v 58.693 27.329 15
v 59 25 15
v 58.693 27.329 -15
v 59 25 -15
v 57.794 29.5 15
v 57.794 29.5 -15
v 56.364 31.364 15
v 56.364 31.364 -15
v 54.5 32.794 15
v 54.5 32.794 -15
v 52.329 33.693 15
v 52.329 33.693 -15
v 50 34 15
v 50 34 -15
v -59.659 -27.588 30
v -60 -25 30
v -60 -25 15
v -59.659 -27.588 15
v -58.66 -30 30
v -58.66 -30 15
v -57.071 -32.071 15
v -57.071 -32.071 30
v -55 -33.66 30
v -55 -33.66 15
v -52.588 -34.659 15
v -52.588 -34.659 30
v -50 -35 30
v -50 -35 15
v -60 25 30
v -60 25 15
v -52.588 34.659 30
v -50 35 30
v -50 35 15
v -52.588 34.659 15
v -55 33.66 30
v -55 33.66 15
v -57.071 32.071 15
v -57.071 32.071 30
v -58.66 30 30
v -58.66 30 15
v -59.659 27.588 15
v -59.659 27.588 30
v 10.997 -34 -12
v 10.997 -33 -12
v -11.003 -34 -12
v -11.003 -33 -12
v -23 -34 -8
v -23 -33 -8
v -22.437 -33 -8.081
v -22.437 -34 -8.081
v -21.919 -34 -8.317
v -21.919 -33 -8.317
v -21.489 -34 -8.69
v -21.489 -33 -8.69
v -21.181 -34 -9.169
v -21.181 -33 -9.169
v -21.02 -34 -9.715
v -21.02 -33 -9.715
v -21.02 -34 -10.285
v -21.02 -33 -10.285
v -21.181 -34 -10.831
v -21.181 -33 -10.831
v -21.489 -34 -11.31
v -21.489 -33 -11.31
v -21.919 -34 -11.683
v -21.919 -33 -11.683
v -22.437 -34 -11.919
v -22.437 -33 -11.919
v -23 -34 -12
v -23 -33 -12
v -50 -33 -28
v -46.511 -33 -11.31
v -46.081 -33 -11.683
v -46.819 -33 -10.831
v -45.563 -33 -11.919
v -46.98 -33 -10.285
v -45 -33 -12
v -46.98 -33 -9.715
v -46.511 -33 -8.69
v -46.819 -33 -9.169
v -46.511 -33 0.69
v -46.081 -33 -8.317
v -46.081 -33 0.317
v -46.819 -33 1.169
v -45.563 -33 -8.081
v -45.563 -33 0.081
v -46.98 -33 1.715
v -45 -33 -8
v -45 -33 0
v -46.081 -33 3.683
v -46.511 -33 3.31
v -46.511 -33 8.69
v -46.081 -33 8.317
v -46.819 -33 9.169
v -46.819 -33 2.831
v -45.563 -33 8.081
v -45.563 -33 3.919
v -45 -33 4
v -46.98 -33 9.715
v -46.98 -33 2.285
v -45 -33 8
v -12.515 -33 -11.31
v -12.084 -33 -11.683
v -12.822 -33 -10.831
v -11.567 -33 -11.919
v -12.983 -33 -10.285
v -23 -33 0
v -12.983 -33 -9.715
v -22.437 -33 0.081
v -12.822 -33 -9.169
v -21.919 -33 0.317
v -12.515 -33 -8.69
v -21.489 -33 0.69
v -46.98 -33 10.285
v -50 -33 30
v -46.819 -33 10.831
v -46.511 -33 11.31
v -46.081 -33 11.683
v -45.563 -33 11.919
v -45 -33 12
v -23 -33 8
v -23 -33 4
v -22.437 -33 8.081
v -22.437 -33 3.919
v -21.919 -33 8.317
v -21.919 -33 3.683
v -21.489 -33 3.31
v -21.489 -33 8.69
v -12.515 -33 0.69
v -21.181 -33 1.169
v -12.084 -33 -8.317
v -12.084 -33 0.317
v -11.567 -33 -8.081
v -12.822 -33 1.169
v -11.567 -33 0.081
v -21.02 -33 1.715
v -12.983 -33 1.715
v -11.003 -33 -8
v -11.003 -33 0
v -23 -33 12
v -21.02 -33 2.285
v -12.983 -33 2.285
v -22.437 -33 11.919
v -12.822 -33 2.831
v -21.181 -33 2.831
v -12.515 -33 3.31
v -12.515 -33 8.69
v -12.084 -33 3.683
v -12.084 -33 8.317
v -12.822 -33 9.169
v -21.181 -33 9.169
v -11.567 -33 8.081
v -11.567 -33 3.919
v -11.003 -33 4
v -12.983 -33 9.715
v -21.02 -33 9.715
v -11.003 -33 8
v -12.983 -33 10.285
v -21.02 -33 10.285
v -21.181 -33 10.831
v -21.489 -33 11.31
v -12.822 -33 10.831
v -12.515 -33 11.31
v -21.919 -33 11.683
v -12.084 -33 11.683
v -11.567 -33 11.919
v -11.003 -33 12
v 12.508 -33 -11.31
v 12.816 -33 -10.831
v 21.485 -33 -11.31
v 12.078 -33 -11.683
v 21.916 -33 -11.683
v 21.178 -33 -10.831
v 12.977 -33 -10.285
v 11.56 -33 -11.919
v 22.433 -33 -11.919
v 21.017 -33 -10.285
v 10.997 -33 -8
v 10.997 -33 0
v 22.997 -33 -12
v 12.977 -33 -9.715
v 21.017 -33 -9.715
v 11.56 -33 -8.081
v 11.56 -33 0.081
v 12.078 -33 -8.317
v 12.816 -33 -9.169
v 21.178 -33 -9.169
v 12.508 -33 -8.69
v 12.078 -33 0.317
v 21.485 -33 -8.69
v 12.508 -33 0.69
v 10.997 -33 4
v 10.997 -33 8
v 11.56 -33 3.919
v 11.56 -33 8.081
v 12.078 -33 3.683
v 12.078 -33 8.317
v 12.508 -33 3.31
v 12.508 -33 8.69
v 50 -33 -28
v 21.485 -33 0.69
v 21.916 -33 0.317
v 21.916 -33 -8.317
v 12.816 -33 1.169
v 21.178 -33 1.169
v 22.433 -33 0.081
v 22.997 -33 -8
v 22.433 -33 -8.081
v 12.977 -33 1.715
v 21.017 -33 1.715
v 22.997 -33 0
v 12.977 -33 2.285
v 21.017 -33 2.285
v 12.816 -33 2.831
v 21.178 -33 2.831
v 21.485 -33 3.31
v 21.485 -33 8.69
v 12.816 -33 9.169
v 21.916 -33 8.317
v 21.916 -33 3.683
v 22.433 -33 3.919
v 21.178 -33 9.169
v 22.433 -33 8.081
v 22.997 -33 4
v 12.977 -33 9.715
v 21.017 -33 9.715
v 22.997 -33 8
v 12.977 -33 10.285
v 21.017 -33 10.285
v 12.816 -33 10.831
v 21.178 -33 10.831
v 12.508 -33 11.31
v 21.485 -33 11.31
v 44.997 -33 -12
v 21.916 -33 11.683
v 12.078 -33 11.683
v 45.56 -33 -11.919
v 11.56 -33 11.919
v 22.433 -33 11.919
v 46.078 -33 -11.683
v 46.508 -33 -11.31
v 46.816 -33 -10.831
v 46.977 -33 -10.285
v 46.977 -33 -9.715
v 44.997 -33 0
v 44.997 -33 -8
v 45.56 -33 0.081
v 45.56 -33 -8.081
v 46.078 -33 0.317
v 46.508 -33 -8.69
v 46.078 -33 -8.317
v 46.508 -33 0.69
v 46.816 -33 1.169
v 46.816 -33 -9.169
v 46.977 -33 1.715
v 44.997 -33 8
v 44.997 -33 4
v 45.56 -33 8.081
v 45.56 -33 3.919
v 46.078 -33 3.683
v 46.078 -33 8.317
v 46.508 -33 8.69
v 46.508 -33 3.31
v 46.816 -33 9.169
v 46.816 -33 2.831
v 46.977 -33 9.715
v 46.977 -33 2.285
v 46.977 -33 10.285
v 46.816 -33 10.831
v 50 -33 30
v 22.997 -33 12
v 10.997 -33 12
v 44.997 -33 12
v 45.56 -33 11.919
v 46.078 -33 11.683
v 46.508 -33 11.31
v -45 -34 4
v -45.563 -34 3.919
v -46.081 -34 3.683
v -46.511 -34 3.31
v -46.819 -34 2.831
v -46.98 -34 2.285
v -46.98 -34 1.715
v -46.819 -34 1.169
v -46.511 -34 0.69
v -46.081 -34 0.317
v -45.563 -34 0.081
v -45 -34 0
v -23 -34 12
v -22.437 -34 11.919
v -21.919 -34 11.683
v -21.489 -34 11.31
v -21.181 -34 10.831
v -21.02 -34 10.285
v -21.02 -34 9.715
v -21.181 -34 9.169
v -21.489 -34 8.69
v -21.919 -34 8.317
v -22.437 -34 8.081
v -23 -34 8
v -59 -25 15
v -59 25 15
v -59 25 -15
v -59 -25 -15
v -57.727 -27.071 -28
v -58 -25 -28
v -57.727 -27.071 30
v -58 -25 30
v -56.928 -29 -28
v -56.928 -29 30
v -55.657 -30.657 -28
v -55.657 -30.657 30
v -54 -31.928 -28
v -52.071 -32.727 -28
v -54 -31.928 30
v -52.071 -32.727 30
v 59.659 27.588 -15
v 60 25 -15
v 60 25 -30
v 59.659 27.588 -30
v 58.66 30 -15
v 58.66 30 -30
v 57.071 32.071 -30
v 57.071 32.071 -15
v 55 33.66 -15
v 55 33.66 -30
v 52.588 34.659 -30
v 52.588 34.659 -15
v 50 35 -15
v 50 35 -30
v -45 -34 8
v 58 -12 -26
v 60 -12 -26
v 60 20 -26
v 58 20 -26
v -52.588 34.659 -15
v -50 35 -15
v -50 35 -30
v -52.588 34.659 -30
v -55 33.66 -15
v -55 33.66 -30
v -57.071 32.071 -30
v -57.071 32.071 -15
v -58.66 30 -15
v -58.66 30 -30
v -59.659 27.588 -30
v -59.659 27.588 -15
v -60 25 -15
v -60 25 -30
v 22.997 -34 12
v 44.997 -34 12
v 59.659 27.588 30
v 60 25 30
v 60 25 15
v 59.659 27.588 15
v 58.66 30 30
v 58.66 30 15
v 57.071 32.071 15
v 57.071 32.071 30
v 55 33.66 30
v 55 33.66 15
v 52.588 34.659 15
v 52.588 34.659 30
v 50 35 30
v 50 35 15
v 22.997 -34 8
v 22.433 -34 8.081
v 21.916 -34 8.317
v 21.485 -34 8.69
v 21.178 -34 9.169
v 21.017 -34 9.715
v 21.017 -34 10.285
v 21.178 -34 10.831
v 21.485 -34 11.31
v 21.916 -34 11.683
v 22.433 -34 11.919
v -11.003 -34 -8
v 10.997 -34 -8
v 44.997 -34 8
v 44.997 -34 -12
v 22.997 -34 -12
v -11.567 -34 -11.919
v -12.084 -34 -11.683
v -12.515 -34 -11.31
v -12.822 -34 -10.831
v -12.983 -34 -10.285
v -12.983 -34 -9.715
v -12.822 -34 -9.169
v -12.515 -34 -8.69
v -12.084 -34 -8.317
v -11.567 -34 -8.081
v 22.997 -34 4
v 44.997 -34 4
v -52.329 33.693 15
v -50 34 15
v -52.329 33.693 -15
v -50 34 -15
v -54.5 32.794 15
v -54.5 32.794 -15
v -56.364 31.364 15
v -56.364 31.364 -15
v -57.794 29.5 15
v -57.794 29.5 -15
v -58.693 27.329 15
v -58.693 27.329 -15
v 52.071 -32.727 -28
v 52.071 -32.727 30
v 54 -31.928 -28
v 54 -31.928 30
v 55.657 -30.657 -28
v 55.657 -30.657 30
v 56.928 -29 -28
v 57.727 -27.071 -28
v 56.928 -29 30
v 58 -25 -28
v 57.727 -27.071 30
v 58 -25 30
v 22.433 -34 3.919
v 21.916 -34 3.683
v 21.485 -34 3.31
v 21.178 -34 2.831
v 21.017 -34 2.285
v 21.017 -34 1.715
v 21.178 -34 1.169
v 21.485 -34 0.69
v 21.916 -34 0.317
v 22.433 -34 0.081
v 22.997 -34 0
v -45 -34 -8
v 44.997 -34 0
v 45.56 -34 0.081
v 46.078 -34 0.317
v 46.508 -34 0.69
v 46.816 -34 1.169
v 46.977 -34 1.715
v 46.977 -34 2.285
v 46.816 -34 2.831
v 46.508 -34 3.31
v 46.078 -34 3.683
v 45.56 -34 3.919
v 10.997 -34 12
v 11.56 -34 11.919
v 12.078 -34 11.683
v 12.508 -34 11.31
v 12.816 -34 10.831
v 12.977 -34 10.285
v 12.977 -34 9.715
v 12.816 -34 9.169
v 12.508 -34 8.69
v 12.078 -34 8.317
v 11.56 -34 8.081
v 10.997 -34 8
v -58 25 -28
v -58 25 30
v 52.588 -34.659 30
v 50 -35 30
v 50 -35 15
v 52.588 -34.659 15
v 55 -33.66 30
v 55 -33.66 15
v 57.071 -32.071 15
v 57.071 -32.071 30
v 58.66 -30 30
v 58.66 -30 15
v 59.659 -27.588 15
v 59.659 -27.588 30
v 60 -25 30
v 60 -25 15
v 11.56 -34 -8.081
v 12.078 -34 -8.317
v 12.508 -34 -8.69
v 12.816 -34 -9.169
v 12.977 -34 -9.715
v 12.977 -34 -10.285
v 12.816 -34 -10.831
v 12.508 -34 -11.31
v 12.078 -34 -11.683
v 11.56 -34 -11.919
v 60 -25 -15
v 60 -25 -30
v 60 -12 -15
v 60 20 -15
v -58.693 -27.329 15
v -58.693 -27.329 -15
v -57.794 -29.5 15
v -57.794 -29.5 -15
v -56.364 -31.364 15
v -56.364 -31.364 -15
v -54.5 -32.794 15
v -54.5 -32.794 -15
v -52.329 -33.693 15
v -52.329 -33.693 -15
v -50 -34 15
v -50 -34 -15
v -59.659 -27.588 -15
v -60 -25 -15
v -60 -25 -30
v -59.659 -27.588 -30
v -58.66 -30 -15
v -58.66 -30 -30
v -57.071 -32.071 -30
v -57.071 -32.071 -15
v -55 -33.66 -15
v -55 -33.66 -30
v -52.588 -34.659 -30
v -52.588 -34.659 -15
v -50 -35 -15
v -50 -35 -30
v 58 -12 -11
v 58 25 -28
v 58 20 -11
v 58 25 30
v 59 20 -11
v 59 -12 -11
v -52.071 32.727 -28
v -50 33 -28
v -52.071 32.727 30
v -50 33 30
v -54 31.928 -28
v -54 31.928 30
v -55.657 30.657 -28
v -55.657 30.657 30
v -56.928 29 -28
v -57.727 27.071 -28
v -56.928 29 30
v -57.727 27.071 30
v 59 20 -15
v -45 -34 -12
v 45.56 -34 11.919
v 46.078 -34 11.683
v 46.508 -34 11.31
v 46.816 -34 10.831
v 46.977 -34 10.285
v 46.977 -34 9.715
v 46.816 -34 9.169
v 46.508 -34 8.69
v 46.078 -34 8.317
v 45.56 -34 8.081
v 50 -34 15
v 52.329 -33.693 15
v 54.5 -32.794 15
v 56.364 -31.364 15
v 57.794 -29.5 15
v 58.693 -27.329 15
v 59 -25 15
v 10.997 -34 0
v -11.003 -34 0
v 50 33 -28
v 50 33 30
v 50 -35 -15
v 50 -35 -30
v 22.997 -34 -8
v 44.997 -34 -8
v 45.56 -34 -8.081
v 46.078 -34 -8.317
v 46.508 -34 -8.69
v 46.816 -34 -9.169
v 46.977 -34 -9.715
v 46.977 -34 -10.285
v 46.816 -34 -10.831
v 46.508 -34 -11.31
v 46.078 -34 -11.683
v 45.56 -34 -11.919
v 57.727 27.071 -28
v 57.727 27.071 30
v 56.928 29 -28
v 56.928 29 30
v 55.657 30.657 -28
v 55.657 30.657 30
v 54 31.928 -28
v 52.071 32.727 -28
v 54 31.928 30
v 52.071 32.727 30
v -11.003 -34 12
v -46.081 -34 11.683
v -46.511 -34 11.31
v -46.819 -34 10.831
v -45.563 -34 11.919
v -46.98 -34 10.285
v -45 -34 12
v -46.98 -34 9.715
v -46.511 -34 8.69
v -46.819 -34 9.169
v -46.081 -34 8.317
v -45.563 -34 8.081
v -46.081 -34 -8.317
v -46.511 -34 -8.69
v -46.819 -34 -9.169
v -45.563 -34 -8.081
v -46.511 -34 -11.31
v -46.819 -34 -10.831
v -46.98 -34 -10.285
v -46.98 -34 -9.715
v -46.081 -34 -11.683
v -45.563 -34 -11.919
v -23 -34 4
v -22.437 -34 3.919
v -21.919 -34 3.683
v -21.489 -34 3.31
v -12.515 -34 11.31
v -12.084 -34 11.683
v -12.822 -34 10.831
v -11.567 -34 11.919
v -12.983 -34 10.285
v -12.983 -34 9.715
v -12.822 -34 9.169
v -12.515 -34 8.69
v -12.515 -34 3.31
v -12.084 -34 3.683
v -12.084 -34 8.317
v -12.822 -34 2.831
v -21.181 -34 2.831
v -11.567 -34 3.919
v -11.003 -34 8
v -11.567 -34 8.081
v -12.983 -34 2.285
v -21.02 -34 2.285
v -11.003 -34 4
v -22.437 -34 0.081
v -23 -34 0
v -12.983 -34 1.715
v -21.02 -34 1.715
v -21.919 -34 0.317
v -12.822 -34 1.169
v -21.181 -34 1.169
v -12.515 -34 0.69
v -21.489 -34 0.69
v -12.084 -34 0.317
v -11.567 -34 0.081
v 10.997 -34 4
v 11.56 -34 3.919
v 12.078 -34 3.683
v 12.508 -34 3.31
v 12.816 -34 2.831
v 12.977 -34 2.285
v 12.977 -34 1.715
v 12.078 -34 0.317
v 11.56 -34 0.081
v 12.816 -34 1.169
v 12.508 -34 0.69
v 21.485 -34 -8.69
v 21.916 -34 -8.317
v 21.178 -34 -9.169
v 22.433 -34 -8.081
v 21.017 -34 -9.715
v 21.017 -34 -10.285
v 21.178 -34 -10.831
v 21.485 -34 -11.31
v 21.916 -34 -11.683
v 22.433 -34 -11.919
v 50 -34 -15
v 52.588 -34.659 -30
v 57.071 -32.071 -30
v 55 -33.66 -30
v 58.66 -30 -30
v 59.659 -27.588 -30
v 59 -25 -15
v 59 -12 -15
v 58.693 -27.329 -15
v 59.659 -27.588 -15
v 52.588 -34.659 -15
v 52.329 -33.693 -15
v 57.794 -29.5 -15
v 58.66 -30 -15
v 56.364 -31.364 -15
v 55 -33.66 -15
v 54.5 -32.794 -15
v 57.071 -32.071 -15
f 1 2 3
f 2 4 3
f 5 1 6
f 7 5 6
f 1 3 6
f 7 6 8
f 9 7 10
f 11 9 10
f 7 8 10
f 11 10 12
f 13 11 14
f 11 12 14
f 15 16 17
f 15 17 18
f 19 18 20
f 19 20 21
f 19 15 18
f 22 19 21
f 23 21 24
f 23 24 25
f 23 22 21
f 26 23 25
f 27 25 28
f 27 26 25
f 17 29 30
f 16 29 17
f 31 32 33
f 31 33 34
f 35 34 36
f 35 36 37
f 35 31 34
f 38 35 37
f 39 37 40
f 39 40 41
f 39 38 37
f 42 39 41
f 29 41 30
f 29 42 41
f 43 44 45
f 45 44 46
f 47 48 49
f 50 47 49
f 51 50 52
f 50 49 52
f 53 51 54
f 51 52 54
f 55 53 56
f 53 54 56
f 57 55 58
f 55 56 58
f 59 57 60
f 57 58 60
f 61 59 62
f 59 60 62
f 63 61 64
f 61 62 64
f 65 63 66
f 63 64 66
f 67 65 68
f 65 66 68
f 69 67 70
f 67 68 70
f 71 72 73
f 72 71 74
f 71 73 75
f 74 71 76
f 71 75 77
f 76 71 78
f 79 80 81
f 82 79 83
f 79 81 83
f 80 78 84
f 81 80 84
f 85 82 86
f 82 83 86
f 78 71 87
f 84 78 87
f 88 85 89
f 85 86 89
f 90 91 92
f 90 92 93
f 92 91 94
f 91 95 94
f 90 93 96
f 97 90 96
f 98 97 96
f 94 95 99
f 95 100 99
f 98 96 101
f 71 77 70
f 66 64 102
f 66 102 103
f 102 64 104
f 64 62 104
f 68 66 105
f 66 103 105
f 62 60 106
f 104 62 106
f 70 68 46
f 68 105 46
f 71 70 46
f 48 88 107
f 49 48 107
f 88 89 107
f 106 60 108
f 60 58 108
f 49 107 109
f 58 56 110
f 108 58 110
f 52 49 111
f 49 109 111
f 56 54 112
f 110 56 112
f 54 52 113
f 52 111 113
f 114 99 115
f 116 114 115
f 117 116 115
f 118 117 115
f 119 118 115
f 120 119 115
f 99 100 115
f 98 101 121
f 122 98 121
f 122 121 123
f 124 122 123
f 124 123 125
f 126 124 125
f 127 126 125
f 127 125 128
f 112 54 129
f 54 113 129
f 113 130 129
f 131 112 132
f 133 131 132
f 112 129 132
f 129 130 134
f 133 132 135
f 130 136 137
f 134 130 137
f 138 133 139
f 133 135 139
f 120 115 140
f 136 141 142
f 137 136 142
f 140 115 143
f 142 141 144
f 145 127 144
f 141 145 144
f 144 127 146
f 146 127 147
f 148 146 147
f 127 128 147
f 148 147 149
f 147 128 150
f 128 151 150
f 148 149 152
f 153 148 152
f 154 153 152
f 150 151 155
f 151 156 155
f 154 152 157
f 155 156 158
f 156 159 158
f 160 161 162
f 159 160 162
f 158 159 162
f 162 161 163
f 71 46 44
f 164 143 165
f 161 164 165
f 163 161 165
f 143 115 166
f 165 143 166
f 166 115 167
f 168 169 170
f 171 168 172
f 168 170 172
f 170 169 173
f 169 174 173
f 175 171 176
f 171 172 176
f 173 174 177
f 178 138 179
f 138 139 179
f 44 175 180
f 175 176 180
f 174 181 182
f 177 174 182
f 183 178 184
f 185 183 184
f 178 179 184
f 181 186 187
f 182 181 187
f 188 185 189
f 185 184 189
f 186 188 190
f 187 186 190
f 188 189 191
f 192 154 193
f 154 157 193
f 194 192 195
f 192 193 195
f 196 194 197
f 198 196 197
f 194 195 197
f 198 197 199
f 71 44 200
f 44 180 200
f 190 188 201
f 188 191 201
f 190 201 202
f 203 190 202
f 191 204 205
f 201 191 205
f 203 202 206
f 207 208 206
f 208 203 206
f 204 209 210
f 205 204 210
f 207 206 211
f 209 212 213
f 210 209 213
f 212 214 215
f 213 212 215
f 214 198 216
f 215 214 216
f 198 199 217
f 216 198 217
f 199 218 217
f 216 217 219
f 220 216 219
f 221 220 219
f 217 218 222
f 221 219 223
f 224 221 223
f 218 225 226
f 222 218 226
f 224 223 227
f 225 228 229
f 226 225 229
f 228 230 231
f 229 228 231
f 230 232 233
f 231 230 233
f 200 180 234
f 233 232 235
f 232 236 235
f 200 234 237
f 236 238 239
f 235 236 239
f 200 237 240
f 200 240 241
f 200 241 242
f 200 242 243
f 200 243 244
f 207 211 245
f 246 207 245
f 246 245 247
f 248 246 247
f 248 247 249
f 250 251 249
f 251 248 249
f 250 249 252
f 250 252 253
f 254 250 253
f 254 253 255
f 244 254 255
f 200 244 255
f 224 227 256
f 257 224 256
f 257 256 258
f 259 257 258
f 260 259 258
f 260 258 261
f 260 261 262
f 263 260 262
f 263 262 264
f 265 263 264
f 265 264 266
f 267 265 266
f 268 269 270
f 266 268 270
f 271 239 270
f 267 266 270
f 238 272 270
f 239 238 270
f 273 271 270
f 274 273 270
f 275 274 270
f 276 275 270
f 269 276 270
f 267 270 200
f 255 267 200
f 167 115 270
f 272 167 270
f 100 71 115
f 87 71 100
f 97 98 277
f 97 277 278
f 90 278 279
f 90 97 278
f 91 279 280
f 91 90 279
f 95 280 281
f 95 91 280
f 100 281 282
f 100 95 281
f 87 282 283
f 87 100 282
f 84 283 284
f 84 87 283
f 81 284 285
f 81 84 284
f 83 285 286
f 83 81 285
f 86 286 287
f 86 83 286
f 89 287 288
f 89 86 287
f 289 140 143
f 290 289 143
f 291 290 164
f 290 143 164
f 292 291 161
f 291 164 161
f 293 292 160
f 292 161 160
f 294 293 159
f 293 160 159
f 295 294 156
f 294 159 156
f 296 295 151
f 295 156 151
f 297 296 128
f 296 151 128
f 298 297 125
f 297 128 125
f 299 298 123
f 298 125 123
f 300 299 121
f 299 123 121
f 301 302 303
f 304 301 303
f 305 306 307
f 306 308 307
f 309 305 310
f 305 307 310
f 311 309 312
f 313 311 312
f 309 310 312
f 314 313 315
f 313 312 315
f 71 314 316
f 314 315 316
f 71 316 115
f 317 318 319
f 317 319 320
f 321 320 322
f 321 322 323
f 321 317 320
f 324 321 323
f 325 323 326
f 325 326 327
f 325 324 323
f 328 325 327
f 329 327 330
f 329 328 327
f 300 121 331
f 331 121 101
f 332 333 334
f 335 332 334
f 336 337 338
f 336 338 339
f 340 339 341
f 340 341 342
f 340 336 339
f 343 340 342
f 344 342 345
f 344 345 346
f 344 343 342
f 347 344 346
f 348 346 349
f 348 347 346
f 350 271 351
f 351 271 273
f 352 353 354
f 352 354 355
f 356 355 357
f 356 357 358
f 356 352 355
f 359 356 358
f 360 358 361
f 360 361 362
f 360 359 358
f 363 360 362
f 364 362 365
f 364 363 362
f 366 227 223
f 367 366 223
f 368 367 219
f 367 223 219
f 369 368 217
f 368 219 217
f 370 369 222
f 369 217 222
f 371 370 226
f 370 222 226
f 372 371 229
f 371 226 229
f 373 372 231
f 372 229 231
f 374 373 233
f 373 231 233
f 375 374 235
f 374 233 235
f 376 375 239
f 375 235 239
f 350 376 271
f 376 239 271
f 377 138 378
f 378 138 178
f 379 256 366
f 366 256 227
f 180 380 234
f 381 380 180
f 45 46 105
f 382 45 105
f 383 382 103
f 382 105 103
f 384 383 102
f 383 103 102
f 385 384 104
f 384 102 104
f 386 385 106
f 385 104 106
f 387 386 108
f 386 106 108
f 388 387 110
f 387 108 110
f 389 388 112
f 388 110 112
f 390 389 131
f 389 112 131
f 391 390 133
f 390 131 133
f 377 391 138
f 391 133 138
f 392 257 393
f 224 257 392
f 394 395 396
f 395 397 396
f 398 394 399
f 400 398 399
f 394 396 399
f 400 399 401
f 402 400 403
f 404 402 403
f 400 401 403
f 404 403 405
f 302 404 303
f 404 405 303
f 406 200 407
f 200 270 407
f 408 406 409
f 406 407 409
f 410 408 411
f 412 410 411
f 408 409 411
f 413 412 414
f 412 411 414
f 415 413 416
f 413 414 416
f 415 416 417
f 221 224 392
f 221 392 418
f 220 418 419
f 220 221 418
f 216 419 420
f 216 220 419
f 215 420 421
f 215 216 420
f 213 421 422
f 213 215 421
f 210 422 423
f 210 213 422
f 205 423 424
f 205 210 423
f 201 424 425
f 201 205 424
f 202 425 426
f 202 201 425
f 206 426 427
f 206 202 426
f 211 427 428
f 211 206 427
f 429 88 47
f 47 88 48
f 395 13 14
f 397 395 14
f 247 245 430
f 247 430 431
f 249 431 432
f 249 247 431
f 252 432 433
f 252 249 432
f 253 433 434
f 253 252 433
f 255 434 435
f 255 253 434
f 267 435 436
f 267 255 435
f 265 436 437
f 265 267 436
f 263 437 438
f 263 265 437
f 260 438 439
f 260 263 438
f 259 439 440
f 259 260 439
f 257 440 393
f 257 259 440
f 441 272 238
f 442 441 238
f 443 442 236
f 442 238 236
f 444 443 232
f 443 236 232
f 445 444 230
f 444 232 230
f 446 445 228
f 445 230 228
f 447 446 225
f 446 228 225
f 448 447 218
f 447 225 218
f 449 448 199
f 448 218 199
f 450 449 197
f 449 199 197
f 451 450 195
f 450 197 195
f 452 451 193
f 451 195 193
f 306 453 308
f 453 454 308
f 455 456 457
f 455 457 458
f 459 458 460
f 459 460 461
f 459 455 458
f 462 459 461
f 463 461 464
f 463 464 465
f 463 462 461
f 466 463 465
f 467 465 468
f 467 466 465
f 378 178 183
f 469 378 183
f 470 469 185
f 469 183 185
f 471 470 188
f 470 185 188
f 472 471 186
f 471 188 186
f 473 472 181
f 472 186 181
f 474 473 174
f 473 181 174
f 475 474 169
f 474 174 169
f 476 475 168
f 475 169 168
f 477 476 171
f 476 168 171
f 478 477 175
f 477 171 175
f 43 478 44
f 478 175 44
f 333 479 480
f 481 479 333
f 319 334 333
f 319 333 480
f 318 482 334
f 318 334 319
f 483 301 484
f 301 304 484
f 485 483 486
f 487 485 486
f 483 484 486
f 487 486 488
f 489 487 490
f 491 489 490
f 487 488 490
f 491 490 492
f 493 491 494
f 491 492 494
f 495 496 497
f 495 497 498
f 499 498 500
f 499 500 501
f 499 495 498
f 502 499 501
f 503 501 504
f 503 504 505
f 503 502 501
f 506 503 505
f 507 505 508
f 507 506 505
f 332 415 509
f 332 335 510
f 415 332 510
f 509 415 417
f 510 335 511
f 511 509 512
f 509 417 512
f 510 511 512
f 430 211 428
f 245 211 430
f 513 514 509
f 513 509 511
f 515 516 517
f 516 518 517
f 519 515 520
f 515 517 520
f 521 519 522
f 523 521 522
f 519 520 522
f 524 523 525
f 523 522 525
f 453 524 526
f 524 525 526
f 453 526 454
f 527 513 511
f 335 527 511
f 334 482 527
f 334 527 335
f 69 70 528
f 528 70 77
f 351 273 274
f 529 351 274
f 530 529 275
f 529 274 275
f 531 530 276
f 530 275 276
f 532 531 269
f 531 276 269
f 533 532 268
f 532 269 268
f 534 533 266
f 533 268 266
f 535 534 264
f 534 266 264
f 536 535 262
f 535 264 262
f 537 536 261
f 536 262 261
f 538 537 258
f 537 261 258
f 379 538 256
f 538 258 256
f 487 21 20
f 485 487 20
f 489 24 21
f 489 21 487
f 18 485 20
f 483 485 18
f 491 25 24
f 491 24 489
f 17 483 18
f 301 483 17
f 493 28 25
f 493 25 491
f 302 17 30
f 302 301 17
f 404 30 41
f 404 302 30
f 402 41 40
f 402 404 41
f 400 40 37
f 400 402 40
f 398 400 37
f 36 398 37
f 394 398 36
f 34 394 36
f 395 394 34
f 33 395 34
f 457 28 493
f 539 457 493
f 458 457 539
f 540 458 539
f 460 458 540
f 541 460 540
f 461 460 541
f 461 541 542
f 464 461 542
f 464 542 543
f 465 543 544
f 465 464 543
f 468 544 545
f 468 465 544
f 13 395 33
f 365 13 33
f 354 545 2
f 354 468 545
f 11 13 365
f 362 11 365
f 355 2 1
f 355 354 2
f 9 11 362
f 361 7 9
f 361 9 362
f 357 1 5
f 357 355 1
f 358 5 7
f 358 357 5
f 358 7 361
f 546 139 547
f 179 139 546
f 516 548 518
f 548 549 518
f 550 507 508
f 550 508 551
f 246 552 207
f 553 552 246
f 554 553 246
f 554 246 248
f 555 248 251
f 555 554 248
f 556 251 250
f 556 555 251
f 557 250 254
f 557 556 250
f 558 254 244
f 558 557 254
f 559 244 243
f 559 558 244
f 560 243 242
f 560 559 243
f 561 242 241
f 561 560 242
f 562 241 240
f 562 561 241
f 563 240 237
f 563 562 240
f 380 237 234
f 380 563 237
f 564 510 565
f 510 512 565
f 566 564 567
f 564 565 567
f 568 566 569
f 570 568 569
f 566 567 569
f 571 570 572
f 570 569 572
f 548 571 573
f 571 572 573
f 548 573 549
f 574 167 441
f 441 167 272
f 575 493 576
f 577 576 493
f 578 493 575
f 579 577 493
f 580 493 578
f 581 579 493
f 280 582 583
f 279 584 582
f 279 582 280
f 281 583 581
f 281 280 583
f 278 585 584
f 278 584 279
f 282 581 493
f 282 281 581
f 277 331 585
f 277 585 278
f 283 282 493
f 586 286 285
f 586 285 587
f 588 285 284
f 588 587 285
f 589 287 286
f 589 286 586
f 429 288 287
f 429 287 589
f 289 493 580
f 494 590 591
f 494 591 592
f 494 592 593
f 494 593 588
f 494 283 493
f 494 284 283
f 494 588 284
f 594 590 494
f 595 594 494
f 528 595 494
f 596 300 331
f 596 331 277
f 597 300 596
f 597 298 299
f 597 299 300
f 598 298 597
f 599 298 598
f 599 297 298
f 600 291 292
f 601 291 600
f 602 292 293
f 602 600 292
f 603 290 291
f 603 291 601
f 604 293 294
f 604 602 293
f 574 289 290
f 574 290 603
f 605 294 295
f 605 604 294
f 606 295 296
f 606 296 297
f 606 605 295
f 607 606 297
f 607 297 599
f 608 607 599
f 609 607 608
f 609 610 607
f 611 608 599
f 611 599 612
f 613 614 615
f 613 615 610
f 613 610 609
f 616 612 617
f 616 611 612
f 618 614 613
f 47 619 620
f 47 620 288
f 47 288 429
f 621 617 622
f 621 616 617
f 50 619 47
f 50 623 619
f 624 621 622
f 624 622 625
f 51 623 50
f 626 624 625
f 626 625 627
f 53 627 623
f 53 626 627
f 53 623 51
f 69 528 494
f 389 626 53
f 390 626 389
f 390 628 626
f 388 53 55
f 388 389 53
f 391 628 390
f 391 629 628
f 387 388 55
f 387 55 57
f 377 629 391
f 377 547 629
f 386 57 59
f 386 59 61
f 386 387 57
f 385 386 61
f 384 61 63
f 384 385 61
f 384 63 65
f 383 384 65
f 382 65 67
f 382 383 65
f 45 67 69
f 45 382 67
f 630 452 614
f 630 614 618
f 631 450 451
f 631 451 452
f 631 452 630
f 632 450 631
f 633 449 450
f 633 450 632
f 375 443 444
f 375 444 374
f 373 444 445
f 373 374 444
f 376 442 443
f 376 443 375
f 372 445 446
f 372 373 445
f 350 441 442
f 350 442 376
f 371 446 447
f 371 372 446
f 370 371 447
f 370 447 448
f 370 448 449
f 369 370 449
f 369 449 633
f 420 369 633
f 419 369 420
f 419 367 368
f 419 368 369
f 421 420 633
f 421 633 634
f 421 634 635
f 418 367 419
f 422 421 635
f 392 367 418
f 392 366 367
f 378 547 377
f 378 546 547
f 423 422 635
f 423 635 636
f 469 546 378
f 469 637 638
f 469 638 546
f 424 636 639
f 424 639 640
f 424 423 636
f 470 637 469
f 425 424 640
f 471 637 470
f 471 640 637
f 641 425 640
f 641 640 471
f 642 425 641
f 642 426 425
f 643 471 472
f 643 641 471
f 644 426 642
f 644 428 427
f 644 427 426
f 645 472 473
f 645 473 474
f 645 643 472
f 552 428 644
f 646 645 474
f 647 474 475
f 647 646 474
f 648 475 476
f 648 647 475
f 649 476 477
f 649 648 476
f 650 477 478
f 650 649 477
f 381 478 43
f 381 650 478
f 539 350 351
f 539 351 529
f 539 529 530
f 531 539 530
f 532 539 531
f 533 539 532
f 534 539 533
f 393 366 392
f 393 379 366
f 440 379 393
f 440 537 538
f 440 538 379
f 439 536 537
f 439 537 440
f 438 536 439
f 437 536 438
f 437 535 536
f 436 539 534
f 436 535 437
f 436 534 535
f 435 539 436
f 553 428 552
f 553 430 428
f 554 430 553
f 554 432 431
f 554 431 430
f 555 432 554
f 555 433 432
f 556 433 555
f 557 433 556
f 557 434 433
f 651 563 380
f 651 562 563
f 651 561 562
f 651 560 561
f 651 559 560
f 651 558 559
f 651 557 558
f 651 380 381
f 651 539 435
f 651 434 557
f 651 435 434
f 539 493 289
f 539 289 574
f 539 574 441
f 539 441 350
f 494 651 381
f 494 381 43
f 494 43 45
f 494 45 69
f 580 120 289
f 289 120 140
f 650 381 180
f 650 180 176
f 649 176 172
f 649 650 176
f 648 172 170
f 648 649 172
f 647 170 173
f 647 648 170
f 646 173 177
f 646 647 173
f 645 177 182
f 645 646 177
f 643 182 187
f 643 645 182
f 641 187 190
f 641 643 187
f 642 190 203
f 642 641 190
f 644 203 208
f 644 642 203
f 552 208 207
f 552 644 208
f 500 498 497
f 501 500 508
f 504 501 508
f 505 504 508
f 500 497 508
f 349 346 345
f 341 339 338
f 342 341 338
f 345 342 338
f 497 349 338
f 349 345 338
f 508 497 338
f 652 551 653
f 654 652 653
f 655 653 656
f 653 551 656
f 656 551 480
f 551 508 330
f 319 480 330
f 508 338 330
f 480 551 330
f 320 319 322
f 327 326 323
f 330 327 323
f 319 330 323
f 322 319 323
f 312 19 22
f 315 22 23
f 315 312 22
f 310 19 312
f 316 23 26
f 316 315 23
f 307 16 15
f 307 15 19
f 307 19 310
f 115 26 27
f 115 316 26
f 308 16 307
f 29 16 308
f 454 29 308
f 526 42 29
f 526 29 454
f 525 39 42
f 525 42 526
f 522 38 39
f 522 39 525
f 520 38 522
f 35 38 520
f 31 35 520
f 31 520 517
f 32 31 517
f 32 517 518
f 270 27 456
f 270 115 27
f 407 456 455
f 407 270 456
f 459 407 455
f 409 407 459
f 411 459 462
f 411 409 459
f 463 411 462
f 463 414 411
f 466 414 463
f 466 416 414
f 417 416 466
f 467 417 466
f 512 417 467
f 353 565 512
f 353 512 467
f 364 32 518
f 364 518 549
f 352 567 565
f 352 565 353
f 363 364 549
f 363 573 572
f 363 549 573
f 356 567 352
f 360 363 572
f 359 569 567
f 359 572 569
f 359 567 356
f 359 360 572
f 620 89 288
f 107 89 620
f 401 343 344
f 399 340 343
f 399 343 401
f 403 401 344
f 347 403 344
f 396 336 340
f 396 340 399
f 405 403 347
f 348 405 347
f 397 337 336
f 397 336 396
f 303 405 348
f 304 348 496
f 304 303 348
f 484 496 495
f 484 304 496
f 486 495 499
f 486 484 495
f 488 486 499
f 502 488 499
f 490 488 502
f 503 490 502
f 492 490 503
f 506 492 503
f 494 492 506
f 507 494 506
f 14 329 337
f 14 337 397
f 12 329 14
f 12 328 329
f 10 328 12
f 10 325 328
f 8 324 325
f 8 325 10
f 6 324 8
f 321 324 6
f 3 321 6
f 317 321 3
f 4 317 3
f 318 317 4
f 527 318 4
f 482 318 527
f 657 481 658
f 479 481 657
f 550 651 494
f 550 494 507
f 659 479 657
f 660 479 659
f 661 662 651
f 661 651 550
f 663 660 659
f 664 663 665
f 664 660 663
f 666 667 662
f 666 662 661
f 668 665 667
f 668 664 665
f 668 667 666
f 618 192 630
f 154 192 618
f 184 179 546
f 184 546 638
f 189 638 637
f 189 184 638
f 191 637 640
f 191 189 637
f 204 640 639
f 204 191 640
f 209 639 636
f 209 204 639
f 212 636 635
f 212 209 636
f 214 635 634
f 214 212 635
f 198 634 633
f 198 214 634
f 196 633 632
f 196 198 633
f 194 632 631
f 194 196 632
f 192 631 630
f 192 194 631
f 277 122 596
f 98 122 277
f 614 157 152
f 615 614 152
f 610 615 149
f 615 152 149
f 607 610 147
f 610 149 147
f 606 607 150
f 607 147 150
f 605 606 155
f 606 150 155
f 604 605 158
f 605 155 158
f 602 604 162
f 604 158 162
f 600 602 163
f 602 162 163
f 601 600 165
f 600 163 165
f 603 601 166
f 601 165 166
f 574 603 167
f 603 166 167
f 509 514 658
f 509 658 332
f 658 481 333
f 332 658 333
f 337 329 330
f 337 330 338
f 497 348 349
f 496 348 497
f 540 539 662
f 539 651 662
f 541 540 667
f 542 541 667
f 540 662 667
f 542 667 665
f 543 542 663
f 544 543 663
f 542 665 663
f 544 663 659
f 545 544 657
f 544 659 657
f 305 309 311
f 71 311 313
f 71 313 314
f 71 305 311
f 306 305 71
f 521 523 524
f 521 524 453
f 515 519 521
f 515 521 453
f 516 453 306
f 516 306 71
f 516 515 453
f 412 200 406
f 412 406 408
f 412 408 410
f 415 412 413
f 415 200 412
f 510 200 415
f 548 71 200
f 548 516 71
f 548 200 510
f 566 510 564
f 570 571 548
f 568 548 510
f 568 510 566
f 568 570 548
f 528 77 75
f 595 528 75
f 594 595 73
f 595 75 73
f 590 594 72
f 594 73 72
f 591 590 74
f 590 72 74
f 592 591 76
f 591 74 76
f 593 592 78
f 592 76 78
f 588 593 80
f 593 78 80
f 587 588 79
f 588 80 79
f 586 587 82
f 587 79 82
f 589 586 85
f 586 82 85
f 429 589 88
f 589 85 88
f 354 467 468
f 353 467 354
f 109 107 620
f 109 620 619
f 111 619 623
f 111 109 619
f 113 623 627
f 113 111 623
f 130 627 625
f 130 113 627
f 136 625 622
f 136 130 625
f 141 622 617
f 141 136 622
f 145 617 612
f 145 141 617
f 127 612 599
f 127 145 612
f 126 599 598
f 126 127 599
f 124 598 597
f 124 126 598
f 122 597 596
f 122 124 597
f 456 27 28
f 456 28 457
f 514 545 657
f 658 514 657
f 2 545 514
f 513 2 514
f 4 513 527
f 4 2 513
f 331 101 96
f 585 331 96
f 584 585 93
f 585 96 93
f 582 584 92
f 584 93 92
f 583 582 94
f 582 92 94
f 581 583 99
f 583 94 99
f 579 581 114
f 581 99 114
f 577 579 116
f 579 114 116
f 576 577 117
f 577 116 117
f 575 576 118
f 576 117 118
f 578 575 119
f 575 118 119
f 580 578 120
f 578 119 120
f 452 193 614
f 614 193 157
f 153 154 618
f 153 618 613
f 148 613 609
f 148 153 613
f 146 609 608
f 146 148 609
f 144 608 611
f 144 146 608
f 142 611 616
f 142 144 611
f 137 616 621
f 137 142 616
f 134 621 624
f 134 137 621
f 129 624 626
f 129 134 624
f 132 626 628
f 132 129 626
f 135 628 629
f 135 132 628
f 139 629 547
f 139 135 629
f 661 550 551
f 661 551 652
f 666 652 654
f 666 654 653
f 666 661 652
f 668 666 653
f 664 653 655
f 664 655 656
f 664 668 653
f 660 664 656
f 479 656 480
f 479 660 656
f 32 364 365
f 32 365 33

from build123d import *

# Parameters (mm, degrees)
BOSS_EXTRU_2_DEPTH      = 30
COQUE2_T                = -2
ESQUISSE11_W            = 2
ESQUISSE11_H            = 30
ENL_V_MAT_EXTRU_2_DEPTH = 5
ESQUISSE17_W            = 15
ESQUISSE17_H            = 32
ENL_V_MAT_EXTRU_3_DEPTH = 10


with BuildPart() as part:
    # Esquisse5 → Boss.-Extru.2 (new, symmetric)
    with BuildSketch(Plane.XY):
        with BuildLine():
            Line((-50, -35), (50, -35))
            ThreePointArc((50, -35), (57.071067812, -32.071067812), (60, -25))
            Line((60, -25), (60, 25))
            ThreePointArc((60, 25), (57.071067812, 32.071067812), (50, 35))
            Line((50, 35), (-50, 35))
            ThreePointArc((-50, 35), (-57.071067812, 32.071067812), (-60, 25))
            Line((-60, 25), (-60, -25))
            ThreePointArc((-60, -25), (-57.071067812, -32.071067812), (-50, -35))
        make_face()
    extrude(amount=BOSS_EXTRU_2_DEPTH, both=True)

    # Coque2
    coque2_openings = [part.faces().sort_by_distance(p)[0] for p in [
        (0, 0, 30),
    ]]
    offset(amount=COQUE2_T, openings=coque2_openings, kind=Kind.INTERSECTION)

    # Enlèvement de matière-Balayage11: sweep along a path in Esquisse5<5>
    with BuildLine(Plane.XY) as enl_vement_de_mati_re_balayage11_path:
        Line((-50, -35), (50, -35))
        ThreePointArc((50, -35), (57.071067812, -32.071067812), (60, -25))
        Line((60, -25), (60, 25))
        ThreePointArc((60, 25), (57.071067812, 32.071067812), (50, 35))
        Line((50, 35), (-50, 35))
        ThreePointArc((-50, 35), (-57.071067812, 32.071067812), (-60, 25))
        Line((-60, 25), (-60, -25))
        ThreePointArc((-60, -25), (-57.071067812, -32.071067812), (-50, -35))
    # Esquisse11 → Enlèvement de matière-Balayage11 (sweep, cut)
    with BuildSketch(Plane(origin=(0, 0, 0), x_dir=(1, 0, 0), z_dir=(0, 1, 0))):
        with Locations((-60, 0)):
            Rectangle(ESQUISSE11_W, ESQUISSE11_H)
    sweep(path=enl_vement_de_mati_re_balayage11_path.line, mode=Mode.SUBTRACT)

    # Esquisse16 → Enlèv. mat.-Extru.2 (cut, symmetric)
    with BuildSketch(Plane.XZ.offset(34)):
        with BuildLine():
            Line((22.996916051, 12), (44.996916051, 12))
            ThreePointArc((44.996916051, 12), (46.996916051, 10), (44.996916051, 8))
            Line((44.996916051, 8), (22.996916051, 8))
            ThreePointArc((22.996916051, 8), (20.996916051, 10), (22.996916051, 12))
        make_face()
        with BuildLine():
            Line((-11.003083949, 12), (10.996916051, 12))
            ThreePointArc((10.996916051, 12), (12.996916051, 10), (10.996916051, 8))
            Line((10.996916051, 8), (-11.003083949, 8))
            ThreePointArc((-11.003083949, 8), (-13.003083949, 10), (-11.003083949, 12))
        make_face()
        with BuildLine():
            Line((-45, 12), (-23, 12))
            ThreePointArc((-23, 12), (-21, 10), (-23, 8))
            Line((-23, 8), (-45, 8))
            ThreePointArc((-45, 8), (-47, 10), (-45, 12))
        make_face()
        with BuildLine():
            Line((22.996916051, 0), (44.996916051, 0))
            ThreePointArc((44.996916051, 0), (46.996916051, 2), (44.996916051, 4))
            Line((44.996916051, 4), (22.996916051, 4))
            ThreePointArc((22.996916051, 4), (20.996916051, 2), (22.996916051, 0))
        make_face()
        with BuildLine():
            Line((-11.003083949, 0), (10.996916051, 0))
            ThreePointArc((10.996916051, 0), (12.996916051, 2), (10.996916051, 4))
            Line((10.996916051, 4), (-11.003083949, 4))
            ThreePointArc((-11.003083949, 4), (-13.003083949, 2), (-11.003083949, 0))
        make_face()
        with BuildLine():
            Line((-45, 0), (-23, 0))
            ThreePointArc((-23, 0), (-21, 2), (-23, 4))
            Line((-23, 4), (-45, 4))
            ThreePointArc((-45, 4), (-47, 2), (-45, 0))
        make_face()
        with BuildLine():
            Line((-45, -8), (-23, -8))
            ThreePointArc((-23, -8), (-21, -10), (-23, -12))
            Line((-23, -12), (-45, -12))
            ThreePointArc((-45, -12), (-47, -10), (-45, -8))
        make_face()
        with BuildLine():
            Line((-11.003083949, -8), (10.996916051, -8))
            ThreePointArc((10.996916051, -8), (12.996916051, -10), (10.996916051, -12))
            Line((10.996916051, -12), (-11.003083949, -12))
            ThreePointArc((-11.003083949, -12), (-13.003083949, -10), (-11.003083949, -8))
        make_face()
        with BuildLine():
            Line((22.996916051, -8), (44.996916051, -8))
            ThreePointArc((44.996916051, -8), (46.996916051, -10), (44.996916051, -12))
            Line((44.996916051, -12), (22.996916051, -12))
            ThreePointArc((22.996916051, -12), (20.996916051, -10), (22.996916051, -8))
        make_face()
    extrude(amount=ENL_V_MAT_EXTRU_2_DEPTH, both=True, mode=Mode.SUBTRACT)

    # Esquisse17 → Enlèv. mat.-Extru.3 (cut)
    with BuildSketch(Plane(origin=(60, 0, 0), x_dir=(0, 0, -1), z_dir=(1, 0, 0))):
        with Locations((18.5, 4)):
            Rectangle(ESQUISSE17_W, ESQUISSE17_H)
    extrude(amount=-ENL_V_MAT_EXTRU_3_DEPTH, mode=Mode.SUBTRACT)


solid = part.part
